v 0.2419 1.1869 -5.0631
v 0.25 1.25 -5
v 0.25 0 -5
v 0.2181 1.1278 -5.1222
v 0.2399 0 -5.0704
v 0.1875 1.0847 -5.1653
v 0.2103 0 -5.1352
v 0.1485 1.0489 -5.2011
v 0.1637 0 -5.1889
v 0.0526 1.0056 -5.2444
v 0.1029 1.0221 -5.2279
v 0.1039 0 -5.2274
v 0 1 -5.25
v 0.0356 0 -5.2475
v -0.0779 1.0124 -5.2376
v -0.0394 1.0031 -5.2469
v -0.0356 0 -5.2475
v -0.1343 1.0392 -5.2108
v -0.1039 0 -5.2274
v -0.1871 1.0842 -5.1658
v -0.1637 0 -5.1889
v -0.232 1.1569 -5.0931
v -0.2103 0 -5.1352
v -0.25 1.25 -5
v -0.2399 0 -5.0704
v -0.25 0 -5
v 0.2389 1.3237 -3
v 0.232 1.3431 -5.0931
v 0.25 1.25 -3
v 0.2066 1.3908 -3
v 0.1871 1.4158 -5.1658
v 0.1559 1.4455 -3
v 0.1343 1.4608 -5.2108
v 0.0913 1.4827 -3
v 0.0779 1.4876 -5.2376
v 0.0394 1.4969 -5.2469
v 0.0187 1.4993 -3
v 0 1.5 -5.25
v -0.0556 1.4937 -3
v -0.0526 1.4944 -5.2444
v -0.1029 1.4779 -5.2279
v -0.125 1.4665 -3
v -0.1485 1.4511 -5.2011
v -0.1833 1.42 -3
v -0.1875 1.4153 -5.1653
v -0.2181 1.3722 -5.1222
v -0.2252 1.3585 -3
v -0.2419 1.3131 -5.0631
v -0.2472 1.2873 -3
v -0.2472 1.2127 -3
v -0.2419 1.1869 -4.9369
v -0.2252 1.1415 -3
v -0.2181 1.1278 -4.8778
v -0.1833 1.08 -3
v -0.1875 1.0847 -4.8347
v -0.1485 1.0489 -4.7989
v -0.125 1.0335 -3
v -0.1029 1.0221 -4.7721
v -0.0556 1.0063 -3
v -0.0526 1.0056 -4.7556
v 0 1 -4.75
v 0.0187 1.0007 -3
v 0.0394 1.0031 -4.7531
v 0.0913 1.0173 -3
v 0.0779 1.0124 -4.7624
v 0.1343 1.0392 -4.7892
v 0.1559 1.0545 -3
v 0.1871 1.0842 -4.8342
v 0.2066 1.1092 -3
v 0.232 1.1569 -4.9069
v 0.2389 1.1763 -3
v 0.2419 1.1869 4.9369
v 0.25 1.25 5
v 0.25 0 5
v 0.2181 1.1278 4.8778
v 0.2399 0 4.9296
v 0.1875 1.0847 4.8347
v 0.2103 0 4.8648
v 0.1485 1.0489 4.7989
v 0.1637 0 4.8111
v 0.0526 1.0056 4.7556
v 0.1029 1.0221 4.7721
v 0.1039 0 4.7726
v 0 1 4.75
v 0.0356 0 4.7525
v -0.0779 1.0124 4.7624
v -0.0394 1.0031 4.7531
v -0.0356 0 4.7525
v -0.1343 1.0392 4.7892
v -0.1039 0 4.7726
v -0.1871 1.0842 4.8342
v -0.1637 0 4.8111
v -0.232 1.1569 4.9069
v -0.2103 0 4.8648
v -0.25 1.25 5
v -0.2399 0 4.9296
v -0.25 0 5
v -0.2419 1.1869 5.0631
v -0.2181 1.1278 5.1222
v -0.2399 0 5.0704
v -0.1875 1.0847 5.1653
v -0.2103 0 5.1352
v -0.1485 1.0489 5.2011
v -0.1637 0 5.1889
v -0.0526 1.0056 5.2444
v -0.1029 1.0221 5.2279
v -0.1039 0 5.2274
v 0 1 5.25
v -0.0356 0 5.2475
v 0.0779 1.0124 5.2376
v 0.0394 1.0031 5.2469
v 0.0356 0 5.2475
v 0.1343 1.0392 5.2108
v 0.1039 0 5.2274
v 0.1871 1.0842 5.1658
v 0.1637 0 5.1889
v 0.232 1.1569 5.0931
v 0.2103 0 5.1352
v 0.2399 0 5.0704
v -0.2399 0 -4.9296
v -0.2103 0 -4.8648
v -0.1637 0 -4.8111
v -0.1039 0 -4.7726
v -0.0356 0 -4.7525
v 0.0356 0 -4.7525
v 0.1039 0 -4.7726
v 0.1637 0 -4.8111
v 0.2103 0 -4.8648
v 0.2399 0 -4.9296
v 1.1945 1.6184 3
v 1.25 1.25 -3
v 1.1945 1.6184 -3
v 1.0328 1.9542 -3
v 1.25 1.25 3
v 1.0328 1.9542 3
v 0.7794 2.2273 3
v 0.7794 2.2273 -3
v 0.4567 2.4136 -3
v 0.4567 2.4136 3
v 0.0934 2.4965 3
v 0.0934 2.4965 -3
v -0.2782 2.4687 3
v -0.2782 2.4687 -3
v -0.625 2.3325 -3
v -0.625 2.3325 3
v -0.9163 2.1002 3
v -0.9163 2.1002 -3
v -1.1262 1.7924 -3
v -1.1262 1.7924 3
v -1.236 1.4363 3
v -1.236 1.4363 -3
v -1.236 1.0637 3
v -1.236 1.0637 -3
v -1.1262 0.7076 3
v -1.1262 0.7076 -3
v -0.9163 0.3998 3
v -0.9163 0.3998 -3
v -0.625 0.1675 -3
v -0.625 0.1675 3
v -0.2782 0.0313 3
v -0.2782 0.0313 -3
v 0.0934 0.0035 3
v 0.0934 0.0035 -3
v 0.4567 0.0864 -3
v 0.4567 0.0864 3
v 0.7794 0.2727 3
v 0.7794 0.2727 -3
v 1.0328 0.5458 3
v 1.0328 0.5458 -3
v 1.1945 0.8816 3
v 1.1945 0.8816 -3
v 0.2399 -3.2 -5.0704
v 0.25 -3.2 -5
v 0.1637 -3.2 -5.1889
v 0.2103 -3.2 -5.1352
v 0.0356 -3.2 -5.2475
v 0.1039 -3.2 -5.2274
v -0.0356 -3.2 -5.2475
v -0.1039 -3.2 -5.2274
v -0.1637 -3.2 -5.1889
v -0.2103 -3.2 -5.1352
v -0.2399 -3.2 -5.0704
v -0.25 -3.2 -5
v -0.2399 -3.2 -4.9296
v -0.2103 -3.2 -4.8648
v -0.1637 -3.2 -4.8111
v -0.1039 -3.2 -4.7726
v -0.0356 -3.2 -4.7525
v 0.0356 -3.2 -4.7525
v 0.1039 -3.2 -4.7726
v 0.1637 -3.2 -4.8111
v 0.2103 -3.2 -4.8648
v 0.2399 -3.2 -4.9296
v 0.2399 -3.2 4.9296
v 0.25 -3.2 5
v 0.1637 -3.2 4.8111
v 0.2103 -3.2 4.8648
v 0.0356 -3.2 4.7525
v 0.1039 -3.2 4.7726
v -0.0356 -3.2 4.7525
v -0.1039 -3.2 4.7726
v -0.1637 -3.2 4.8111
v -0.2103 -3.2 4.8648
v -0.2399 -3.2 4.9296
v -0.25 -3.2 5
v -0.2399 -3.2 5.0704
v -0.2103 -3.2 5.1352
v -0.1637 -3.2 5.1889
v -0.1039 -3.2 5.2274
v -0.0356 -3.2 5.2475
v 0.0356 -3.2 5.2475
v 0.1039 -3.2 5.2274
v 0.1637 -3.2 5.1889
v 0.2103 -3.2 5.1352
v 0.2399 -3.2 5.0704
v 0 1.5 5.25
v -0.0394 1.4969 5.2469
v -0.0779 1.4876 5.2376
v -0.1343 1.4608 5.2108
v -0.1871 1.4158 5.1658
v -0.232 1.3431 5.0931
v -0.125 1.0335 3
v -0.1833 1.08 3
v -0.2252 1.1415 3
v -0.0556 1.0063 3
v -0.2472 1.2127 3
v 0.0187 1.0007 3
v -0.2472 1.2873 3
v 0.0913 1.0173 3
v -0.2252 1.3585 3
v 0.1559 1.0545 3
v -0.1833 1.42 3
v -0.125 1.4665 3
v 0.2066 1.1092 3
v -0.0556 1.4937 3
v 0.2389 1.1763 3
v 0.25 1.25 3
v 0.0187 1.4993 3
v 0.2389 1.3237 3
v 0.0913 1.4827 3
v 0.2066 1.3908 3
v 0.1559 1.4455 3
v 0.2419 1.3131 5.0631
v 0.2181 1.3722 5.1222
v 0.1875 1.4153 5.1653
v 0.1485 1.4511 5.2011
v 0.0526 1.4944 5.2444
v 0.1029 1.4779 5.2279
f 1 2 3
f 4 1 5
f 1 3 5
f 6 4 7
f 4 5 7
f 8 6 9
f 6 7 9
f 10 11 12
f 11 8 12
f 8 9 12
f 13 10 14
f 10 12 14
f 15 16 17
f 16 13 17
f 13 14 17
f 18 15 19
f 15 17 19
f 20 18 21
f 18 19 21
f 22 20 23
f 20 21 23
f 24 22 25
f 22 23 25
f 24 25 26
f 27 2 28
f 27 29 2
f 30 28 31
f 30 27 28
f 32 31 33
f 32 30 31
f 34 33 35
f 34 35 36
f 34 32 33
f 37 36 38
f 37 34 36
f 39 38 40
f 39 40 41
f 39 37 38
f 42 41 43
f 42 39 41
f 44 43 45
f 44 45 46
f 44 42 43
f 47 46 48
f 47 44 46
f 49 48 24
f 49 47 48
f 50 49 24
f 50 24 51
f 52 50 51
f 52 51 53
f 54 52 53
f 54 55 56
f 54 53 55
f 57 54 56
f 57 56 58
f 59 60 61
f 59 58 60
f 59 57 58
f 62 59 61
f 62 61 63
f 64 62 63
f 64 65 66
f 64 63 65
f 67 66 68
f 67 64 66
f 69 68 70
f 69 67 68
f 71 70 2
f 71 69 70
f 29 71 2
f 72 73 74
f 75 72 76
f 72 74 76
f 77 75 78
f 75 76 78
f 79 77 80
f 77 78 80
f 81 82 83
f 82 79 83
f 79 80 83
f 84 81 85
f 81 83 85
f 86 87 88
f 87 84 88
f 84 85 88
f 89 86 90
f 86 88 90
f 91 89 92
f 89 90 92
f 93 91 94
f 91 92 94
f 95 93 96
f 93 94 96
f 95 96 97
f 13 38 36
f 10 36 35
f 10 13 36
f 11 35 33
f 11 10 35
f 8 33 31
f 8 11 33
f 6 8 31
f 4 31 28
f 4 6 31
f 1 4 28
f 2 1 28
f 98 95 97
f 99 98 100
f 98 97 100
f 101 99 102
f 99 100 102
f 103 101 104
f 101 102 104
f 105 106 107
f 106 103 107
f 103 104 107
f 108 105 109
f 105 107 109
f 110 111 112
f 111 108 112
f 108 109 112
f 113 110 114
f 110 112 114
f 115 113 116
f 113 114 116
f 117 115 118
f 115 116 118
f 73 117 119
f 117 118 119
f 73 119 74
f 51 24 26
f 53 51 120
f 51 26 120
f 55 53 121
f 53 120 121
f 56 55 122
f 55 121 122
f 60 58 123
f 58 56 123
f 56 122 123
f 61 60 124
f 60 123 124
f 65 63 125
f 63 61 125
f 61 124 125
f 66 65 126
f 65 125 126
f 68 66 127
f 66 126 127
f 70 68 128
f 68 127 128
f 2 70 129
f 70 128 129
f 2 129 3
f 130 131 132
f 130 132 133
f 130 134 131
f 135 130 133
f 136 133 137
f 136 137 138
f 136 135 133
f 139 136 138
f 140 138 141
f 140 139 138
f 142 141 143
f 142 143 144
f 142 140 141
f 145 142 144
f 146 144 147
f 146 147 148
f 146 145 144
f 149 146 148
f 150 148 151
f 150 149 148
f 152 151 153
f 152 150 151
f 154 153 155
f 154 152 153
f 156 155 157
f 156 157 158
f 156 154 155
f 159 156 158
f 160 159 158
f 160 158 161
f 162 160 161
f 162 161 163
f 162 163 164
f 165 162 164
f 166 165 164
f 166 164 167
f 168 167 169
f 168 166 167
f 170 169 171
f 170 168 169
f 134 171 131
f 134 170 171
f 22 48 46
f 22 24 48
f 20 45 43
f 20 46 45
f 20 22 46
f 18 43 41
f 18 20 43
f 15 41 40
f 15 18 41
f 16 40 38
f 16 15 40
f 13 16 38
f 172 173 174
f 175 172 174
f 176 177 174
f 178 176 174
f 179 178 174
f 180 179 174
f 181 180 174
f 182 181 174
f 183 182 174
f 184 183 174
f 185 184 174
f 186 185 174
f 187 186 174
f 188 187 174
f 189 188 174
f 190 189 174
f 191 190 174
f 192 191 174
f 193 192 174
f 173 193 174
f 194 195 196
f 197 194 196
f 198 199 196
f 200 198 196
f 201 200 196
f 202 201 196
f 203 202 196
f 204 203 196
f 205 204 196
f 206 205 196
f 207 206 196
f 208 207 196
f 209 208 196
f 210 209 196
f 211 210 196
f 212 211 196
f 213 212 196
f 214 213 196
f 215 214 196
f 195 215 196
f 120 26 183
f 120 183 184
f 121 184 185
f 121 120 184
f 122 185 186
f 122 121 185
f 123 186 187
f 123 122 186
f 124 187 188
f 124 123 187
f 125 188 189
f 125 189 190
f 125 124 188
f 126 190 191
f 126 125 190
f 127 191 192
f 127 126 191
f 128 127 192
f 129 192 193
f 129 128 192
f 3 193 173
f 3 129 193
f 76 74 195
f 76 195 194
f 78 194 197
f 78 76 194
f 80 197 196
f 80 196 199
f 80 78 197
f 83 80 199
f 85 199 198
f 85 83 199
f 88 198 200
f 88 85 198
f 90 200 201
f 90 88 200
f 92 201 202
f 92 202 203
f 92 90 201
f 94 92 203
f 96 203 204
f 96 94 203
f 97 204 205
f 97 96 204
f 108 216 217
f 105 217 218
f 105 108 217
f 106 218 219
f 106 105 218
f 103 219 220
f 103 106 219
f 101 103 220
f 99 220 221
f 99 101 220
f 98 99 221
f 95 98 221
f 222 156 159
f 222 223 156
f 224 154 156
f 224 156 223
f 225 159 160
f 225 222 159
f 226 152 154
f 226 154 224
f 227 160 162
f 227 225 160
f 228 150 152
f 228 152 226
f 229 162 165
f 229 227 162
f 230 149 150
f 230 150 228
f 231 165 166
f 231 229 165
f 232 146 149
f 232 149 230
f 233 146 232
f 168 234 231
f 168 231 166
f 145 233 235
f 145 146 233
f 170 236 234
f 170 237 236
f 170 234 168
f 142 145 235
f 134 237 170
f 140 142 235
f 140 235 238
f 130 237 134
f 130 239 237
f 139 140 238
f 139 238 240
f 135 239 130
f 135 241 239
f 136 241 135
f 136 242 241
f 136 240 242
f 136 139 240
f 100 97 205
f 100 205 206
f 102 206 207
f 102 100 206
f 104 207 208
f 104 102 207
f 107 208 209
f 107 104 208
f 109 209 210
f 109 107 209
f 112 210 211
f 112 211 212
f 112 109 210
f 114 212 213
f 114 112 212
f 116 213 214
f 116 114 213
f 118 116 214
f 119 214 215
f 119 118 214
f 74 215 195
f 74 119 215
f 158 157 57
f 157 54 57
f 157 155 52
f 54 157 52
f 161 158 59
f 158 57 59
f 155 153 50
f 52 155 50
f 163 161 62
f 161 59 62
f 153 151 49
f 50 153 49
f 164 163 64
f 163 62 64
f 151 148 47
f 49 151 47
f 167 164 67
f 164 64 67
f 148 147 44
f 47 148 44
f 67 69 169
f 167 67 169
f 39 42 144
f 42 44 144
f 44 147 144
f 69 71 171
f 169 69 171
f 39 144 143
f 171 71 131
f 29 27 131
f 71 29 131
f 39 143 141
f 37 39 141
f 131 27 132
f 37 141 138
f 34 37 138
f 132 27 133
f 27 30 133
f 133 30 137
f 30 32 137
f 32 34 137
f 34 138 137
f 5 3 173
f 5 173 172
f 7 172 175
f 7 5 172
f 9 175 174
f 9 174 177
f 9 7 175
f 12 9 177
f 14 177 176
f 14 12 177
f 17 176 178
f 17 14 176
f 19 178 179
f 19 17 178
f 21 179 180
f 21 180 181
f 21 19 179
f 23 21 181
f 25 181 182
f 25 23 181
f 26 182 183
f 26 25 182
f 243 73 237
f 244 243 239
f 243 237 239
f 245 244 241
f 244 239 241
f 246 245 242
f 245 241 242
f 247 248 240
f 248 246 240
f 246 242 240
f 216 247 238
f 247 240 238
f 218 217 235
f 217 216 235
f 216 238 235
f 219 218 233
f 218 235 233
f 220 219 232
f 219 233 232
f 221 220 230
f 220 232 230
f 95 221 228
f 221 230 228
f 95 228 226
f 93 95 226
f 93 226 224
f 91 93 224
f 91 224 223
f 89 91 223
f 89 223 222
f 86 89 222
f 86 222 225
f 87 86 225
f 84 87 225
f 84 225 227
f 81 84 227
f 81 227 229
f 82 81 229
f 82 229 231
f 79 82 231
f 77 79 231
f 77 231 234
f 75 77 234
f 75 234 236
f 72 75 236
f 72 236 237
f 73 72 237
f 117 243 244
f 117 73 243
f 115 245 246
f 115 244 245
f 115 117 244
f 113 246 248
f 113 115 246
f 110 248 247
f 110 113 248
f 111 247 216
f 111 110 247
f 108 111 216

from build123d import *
from build123d.topology import SkipClean

# Parameters (mm, degrees)
SKETCH1_R                       = 1.25
BOSS_EXTRUDE1_DEPTH             = 3
BOSS_EXTRUDE2_DEPTH             = 2.25
BOSS_EXTRUDE2_DEPTH_BACK        = 8.25
SKETCH2_R                       = 0.25
BOSS_EXTRUDE3_REACH             = 7.948
SKETCH3_R                       = 0.25
BOSS_EXTRUDE3_DIRECTION_2_DEPTH = 3.2
CUT_EXTRUDE1_DEPTH              = 8.849522278


with BuildPart() as part:
    # Sketch1 → Boss-Extrude1 (new, symmetric)
    with BuildSketch(Plane.XY):
        with Locations((0, 1.25)):
            Circle(SKETCH1_R)
    extrude(amount=BOSS_EXTRUDE1_DEPTH, both=True)

    # Sketch2 → Boss-Extrude2 (add, two sides: drawn at the far end of the back side and taken through both)
    with BuildSketch(Plane.XY.offset(3).offset(-BOSS_EXTRUDE2_DEPTH_BACK)):
        with Locations((0, 1.25)):
            Circle(SKETCH2_R)
    extrude(amount=BOSS_EXTRUDE2_DEPTH + BOSS_EXTRUDE2_DEPTH_BACK)

    # Sketch3 → Boss-Extrude3 (add, up to next)
    with BuildSketch(Plane(origin=(0, 0, 0), x_dir=(1, 0, 0), z_dir=(0, 1, 0)), mode=Mode.PRIVATE) as boss_extrude3_sk1:
        with Locations((0, -5)):
            Circle(SKETCH3_R)
    boss_extrude3_tool1 = extrude(boss_extrude3_sk1.sketch, amount=BOSS_EXTRUDE3_REACH, mode=Mode.PRIVATE) - part.part
    # Sketch3 → Boss-Extrude3 (add, up to next)
    with BuildSketch(Plane(origin=(0, 0, 0), x_dir=(1, 0, 0), z_dir=(0, 1, 0)), mode=Mode.PRIVATE) as boss_extrude3_sk2:
        with Locations((0, 5)):
            Circle(SKETCH3_R)
    boss_extrude3_tool2 = extrude(boss_extrude3_sk2.sketch, amount=BOSS_EXTRUDE3_REACH, mode=Mode.PRIVATE) - part.part
    add(boss_extrude3_tool1.solids().sort_by_distance((0, 0, 5))[0])
    add(boss_extrude3_tool2.solids().sort_by_distance((0, 0, -5))[0])

    # Sketch3 → Boss-Extrude3 direction 2 (add)
    with SkipClean():  # the faces are left unmerged after this step: merging them gives an invalid solid
        with BuildSketch(Plane(origin=(0, 0, 0), x_dir=(1, 0, 0), z_dir=(0, 1, 0))):
            with Locations((0, -5)):
                Circle(SKETCH3_R)
            with Locations((0, 5)):
                Circle(SKETCH3_R)
        extrude(amount=-BOSS_EXTRUDE3_DIRECTION_2_DEPTH)

    # Sketch4 → Cut-Extrude1 (cut, through all)
    with BuildSketch(Plane(origin=(0, -3.2, 0), x_dir=(-1, 0, 0), z_dir=(0, -1, 0))):
        with BuildLine():
            Line((0.25, -5), (0.35, -5))
            Line((0.35, -5), (0.35, -5.35))
            Line((0.35, -5.35), (-0.35, -5.35))
            Line((-0.35, -5.35), (-0.35, -5))
            Line((-0.35, -5), (-0.25, -5))
            ThreePointArc((-0.25, -5), (0, -5.25), (0.25, -5))
        make_face()
        with BuildLine():
            Line((-0.25, 5), (-0.35, 5))
            Line((-0.35, 5), (-0.35, 5.35))
            Line((-0.35, 5.35), (0.35, 5.35))
            Line((0.35, 5.35), (0.35, 5))
            Line((0.35, 5), (0.25, 5))
            ThreePointArc((0.25, 5), (0, 5.25), (-0.25, 5))
        make_face()
    extrude(amount=-CUT_EXTRUDE1_DEPTH, mode=Mode.SUBTRACT)


solid = part.part
